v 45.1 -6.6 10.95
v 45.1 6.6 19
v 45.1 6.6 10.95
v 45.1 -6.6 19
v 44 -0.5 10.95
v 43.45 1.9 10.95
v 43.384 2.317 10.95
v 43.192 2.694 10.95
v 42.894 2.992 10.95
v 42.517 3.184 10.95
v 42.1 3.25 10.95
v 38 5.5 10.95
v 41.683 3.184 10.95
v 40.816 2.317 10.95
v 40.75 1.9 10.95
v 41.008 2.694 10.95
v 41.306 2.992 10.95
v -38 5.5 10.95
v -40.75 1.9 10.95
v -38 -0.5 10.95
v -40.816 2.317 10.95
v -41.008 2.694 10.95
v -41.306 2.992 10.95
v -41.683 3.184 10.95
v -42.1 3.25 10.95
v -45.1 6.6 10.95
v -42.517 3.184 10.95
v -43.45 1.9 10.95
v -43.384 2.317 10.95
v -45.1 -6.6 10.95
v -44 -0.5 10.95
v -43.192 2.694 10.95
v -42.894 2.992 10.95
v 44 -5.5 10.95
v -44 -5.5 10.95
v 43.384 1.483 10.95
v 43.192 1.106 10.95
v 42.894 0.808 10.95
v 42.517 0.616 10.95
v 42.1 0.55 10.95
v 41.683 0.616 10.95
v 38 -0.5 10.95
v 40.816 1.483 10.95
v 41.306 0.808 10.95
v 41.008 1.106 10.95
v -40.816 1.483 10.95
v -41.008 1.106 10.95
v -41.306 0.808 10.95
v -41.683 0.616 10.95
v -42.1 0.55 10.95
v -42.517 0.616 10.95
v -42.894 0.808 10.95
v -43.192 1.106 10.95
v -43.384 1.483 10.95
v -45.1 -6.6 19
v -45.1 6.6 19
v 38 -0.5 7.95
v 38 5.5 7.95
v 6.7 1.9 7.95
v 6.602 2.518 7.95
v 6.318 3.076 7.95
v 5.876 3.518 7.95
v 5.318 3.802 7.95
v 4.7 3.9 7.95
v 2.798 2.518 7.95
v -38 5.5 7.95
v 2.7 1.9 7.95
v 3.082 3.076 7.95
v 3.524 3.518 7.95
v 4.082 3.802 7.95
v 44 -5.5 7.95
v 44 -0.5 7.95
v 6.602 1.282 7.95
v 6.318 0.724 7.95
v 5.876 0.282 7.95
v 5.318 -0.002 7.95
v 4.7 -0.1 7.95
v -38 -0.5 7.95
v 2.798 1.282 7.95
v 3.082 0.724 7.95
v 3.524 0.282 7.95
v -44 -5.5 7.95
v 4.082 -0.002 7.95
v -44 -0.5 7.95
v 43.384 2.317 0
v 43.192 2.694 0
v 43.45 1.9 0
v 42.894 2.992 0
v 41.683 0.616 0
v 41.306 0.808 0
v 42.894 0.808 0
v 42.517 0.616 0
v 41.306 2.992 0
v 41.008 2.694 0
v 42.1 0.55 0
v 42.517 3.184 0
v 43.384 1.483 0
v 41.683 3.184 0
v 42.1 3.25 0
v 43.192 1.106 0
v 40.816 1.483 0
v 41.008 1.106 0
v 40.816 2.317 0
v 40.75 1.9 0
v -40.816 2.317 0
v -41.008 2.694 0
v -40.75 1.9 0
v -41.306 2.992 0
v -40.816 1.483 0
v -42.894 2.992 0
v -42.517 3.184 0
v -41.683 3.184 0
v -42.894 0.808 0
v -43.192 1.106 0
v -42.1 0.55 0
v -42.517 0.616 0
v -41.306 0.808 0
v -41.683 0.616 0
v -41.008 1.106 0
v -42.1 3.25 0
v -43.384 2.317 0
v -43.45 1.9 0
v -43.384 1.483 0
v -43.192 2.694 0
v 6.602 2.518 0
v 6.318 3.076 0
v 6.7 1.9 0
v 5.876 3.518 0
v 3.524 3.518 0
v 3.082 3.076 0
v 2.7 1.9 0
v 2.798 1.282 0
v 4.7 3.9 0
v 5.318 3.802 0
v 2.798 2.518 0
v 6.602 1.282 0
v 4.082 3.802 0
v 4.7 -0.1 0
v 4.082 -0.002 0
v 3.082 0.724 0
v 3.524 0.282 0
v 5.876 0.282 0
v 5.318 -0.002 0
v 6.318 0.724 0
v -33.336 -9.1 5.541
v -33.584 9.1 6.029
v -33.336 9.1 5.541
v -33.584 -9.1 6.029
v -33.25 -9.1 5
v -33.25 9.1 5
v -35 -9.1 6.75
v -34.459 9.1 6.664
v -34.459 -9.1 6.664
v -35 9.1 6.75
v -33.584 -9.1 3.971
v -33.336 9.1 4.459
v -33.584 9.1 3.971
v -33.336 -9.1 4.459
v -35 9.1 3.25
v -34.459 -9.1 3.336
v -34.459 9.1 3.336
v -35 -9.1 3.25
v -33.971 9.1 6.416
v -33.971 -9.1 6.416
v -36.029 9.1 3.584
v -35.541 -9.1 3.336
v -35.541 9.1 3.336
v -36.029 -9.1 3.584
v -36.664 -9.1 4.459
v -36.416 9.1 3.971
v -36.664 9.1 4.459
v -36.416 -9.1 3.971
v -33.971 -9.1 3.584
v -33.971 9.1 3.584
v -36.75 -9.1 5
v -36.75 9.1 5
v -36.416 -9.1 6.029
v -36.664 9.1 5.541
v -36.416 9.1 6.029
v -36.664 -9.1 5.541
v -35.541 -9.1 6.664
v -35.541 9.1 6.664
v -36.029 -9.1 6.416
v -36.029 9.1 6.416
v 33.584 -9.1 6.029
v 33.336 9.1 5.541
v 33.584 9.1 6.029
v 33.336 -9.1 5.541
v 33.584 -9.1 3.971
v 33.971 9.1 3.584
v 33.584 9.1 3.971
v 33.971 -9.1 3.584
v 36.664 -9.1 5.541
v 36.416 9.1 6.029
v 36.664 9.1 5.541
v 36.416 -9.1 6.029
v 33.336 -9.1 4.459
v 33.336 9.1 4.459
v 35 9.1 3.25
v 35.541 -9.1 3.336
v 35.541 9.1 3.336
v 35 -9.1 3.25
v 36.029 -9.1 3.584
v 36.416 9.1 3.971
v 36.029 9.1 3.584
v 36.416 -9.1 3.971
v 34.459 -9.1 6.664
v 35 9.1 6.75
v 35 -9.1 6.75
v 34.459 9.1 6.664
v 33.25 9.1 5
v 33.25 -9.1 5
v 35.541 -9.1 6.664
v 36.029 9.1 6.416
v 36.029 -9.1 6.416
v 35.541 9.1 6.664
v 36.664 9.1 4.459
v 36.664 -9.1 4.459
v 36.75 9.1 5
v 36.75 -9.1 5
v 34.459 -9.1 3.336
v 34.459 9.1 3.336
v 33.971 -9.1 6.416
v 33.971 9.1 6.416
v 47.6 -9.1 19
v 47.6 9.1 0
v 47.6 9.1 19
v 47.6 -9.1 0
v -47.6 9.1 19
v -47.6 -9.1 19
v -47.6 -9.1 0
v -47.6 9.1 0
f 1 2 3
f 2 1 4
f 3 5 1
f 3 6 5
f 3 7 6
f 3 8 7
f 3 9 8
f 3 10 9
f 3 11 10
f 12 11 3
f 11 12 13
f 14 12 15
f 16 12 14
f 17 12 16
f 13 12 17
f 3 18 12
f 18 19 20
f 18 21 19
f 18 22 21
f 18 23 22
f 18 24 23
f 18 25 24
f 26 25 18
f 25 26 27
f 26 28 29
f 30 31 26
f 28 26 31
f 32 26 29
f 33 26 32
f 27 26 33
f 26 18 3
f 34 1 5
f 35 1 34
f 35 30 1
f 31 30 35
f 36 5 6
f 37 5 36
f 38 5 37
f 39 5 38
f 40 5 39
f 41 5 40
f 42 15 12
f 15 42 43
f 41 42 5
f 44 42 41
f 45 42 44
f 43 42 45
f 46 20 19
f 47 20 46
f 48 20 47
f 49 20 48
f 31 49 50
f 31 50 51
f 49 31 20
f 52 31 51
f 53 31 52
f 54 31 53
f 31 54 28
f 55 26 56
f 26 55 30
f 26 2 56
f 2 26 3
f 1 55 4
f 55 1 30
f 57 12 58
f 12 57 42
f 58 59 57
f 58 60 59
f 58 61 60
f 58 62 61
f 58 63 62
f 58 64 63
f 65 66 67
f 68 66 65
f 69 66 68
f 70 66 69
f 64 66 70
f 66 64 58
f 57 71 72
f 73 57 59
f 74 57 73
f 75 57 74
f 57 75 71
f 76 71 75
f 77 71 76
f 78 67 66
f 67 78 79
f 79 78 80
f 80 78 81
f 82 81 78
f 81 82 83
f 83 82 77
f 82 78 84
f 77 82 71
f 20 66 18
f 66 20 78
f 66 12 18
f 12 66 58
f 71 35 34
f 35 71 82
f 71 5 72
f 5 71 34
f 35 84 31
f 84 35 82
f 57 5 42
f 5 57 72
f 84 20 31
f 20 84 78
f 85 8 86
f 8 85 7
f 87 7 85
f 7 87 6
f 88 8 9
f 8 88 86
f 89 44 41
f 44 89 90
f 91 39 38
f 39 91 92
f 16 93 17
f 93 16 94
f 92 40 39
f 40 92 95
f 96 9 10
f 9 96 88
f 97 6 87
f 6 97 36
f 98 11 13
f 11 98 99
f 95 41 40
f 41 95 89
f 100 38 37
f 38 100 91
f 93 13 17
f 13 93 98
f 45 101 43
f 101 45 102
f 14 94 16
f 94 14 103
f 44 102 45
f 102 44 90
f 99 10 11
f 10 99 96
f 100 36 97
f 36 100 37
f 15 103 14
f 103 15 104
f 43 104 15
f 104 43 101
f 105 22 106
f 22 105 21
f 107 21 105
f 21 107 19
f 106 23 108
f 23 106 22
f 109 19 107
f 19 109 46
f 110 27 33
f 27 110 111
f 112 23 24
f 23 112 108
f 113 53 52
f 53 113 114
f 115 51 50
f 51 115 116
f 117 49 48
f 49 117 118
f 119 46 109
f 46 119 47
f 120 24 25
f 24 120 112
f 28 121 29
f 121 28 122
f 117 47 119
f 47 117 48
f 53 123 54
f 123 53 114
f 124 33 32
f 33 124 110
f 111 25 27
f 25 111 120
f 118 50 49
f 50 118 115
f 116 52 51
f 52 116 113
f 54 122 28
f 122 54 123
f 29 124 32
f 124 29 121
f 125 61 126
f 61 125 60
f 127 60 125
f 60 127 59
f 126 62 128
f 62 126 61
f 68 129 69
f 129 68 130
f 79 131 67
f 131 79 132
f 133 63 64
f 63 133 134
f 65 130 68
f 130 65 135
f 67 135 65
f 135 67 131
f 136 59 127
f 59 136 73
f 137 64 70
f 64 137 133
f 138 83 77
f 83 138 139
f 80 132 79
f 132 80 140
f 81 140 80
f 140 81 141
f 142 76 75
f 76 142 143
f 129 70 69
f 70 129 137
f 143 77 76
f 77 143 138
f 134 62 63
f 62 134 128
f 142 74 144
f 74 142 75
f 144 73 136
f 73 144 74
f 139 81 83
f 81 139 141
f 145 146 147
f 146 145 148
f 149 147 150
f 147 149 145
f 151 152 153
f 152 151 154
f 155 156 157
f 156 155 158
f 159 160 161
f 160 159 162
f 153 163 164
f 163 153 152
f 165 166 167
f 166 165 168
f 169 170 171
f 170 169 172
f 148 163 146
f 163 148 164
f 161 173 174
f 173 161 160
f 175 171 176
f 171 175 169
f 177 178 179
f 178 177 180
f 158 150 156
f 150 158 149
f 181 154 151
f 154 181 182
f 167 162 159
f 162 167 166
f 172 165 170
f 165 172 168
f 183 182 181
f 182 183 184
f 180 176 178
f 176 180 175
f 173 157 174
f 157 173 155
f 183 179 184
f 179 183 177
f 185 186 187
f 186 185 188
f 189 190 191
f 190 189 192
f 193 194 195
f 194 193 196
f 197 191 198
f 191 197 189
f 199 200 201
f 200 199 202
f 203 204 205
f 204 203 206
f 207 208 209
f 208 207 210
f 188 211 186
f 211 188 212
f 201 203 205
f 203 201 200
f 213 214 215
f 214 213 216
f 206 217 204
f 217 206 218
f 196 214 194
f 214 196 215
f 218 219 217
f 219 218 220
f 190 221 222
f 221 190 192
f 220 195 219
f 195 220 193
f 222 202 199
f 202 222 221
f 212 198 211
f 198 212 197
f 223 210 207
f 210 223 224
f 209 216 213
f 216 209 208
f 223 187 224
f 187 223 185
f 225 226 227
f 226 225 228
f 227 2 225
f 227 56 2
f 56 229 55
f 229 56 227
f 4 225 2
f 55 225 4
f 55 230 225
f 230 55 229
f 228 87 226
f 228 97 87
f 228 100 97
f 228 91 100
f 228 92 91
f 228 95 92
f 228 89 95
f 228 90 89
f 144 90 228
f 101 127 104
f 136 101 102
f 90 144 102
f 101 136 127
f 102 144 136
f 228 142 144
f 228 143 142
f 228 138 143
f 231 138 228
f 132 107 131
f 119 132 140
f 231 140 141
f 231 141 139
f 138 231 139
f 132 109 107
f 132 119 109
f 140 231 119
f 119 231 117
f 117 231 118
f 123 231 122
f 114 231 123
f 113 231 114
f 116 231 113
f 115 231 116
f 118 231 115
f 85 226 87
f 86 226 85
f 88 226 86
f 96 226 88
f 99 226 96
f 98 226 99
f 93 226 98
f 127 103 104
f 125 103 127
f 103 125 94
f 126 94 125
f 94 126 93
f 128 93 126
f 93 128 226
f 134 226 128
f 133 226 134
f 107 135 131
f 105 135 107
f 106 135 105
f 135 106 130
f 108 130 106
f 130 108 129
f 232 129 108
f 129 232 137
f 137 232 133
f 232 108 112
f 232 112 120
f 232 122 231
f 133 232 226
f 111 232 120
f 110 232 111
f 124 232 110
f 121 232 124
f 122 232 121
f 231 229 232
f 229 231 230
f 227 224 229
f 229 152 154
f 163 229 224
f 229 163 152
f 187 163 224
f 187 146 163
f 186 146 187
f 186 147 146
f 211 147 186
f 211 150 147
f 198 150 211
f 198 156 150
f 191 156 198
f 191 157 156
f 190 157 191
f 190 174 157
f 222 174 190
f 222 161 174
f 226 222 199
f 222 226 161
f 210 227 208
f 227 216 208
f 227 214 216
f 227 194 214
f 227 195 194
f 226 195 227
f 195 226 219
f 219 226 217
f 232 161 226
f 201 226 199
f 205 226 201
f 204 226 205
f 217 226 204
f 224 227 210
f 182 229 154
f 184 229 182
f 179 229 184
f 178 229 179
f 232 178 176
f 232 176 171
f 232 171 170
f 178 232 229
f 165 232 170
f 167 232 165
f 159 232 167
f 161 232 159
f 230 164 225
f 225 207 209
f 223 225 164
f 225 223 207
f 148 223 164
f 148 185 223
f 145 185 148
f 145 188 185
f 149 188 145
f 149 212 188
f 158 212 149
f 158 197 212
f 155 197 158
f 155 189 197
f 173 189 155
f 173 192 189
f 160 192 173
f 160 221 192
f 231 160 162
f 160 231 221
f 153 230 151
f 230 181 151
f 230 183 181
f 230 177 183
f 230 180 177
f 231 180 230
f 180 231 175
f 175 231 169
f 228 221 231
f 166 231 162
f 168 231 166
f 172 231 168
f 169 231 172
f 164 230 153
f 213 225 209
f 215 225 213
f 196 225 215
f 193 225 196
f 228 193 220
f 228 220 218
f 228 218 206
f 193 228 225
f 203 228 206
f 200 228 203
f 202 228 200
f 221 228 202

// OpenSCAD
pcb_w = 90;
pcb_h = 13;
pcb_fix_hole_dist = 84.2;
pcb_hole_dist_from_top = 8.4;
pcb_size_tolerance = 0.2;

shoulder = 1.0;
edge_width = 2.5;
fixture_depth = 19;
pcb_depth = 8;
soldering_space = 3;
corner_w = 7;
corner_h = 7.0;
hole_1_d = 2.7;
hole_2_d = 3.5;

difference() {

 translate([0,0,fixture_depth/2])
    color("orange") cube([pcb_w + 2*edge_width + pcb_size_tolerance, pcb_h + 2*edge_width + pcb_size_tolerance, fixture_depth], center=true);

    union() {
        translate ([0, 0, fixture_depth-pcb_depth/2]) color("blue") cube([pcb_w + pcb_size_tolerance, pcb_h + pcb_size_tolerance, pcb_depth+0.1], center=true);
        translate ([0, 0, fixture_depth-pcb_depth-soldering_space/2]) color("green") cube([pcb_w - 2*corner_w, pcb_h - 2*shoulder, soldering_space+0.1], center=true);
        translate ([0, shoulder/2 -corner_h/2, fixture_depth-pcb_depth-soldering_space/2]) color("green") cube([pcb_w - 2*shoulder, pcb_h - corner_h - shoulder, soldering_space+0.1], center=true);

        translate ([84.2/2, (8.4-13/2), 0]) color("red") cylinder(2*fixture_depth + 0.1, d = hole_1_d, $fn=20, center=true);
        translate ([-84.2/2, (8.4-13/2), 0]) color("red") cylinder(2*fixture_depth + 0.1, d = hole_1_d, $fn=20, center=true);
        translate ([84.2/2 - 37.4, (8.4-13/2), 0]) color("red") cylinder(fixture_depth + 0.1, d = 4, $fn=20, center=true);

        translate ([-35, 0, 5]) rotate([90, 90, 0]) color("red") cylinder(30, d = hole_2_d, $fn=20, center=true);
        translate ([35, 0, 5]) rotate([90, 90, 0]) color("red") cylinder(30, d = hole_2_d, $fn=20, center=true);
    }
}
